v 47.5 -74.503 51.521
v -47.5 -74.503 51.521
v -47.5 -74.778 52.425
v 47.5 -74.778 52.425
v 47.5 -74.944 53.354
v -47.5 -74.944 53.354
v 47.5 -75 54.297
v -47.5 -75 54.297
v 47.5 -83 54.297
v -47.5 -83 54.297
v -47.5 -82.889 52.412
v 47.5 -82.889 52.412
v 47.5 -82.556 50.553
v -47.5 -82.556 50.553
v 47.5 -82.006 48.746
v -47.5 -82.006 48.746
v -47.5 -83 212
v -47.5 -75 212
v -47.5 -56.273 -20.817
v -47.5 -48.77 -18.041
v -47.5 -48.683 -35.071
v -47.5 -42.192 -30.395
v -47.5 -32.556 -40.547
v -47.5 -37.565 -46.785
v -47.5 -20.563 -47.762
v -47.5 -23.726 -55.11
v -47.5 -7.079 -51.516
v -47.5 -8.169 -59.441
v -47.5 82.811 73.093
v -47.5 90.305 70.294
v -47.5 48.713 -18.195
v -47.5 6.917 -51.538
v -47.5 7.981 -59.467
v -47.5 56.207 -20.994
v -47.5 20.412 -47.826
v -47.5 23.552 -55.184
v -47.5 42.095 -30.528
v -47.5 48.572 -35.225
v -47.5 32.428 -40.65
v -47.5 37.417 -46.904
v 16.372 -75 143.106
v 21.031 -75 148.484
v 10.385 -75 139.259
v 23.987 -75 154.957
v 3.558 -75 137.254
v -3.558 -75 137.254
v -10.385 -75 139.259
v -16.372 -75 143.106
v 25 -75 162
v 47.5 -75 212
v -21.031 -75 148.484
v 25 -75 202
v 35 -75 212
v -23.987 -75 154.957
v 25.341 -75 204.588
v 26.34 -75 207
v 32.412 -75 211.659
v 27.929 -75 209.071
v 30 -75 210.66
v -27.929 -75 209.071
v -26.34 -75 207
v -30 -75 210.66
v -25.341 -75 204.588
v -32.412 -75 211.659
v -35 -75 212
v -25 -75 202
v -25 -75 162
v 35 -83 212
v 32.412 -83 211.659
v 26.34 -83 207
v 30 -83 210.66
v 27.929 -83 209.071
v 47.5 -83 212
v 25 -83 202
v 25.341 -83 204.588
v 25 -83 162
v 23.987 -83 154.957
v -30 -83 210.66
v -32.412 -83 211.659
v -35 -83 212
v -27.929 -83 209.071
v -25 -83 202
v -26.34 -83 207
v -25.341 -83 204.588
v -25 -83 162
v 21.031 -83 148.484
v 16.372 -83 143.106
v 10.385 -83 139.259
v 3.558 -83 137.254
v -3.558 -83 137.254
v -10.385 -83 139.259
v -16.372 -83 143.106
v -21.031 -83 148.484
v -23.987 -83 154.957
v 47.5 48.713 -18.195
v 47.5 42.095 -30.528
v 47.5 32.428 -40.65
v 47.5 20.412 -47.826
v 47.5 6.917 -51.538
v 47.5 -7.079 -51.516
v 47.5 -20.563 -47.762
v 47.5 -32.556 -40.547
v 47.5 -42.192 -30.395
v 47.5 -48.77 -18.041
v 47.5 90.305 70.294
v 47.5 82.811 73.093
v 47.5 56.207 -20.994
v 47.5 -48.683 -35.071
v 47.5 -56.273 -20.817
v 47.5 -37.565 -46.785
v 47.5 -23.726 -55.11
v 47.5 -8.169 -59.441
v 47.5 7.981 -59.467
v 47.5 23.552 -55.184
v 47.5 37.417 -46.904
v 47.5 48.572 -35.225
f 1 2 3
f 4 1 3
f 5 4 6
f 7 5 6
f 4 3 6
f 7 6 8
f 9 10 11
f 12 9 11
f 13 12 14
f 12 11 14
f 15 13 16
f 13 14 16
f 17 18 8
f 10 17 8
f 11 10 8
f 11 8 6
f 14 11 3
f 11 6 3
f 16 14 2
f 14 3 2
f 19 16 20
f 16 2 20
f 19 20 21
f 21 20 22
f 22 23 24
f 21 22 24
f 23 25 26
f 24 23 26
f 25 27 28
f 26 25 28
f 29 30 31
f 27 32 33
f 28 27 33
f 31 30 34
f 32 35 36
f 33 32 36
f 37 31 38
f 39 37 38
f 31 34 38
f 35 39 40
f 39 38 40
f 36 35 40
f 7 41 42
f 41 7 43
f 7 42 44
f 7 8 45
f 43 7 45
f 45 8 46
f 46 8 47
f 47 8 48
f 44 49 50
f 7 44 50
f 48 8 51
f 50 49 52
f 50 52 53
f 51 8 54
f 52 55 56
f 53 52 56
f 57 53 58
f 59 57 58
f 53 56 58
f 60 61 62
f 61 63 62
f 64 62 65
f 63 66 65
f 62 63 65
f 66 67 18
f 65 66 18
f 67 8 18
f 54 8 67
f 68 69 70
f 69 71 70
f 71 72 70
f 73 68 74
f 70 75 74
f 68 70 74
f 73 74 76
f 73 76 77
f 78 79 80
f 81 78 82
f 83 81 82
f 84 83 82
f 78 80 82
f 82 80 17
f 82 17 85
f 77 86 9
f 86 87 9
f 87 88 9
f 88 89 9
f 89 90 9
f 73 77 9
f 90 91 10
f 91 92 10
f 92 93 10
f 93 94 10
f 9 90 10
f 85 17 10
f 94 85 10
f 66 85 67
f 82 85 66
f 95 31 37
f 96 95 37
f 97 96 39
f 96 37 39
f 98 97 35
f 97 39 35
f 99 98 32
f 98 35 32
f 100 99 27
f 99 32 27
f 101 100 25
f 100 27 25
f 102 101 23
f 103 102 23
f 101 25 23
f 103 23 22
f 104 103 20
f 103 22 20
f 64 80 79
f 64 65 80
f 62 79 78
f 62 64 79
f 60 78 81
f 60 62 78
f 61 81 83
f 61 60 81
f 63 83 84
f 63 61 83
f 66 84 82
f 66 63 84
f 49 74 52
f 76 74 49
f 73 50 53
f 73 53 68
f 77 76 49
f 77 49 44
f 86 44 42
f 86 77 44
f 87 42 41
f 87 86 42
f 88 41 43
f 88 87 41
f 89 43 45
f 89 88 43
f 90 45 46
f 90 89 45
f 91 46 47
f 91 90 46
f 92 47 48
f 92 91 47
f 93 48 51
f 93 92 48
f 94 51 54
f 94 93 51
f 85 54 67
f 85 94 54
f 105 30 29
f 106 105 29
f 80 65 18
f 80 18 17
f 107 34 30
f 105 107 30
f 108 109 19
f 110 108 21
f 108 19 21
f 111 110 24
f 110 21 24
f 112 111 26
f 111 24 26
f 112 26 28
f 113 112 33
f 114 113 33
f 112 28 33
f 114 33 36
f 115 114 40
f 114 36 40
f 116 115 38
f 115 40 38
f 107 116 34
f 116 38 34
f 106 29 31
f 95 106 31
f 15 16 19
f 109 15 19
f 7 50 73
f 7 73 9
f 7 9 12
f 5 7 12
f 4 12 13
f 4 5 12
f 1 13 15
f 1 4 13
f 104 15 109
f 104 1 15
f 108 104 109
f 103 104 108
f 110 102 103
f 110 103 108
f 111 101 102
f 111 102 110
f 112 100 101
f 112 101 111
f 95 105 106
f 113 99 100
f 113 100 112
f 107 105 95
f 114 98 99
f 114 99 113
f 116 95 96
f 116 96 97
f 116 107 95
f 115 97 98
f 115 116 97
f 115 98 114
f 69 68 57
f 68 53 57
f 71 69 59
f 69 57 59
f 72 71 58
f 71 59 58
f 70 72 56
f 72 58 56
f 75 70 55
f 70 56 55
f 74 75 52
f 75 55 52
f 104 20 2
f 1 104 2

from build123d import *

# Parameters (mm, degrees)
SM_START               = -47.5
SM_BASE_FLANGE_1_DEPTH = 95
CUT_EXTRUDE_1_DEPTH    = 278.911623222
FILLET_1_R             = 10


# Read off the part's stored shape, not the designer's step: 基体-法兰1
with BuildPart() as part:
    # 基体-法兰1 outline → 基体-法兰1 (new body)
    with BuildSketch(Plane(origin=(0, 0, 0), x_dir=(0, 0, -1), z_dir=(1, 0, 0)).offset(SM_START)):
        with BuildLine():
            Line((20.994484106, 56.207042593), (-70.293536893, 90.304992202))
            Line((-70.293536893, 90.304992202), (-73.092801441, 82.810719856))
            Line((-73.092801441, 82.810719856), (18.195219559, 48.712770248))
            ThreePointArc((18.195219559, 48.712770248), (51.999935218, -0.082081346), (18.041344088, -48.769969279))
            Line((18.041344088, -48.769969279), (-51.521246849, -74.503072197))
            ThreePointArc((-51.521246849, -74.503072197), (-52.886976122, -74.874788174), (-54.296838247, -75))
            Line((-54.296838247, -75), (-212, -75))
            Line((-212, -75), (-212, -83))
            Line((-212, -83), (-54.296838247, -83))
            ThreePointArc((-54.296838247, -83), (-51.477113996, -82.749576348), (-48.74565545, -82.006144394))
            Line((-48.74565545, -82.006144394), (20.816935486, -56.273041476))
            ThreePointArc((20.816935486, -56.273041476), (59.999925251, -0.094709246), (20.994484106, 56.207042593))
        make_face()
    extrude(amount=SM_BASE_FLANGE_1_DEPTH)

    # 草图6 → 切除-拉伸1 (cut, through all)
    with BuildSketch(Plane.XZ.offset(83)):
        with BuildLine():
            Line((-25, 162), (-25, 212))
            Line((-25, 212), (25, 212))
            Line((25, 212), (25, 162))
            ThreePointArc((25, 162), (0, 137), (-25, 162))
        make_face()
    extrude(amount=-CUT_EXTRUDE_1_DEPTH, mode=Mode.SUBTRACT)

    # 圆角1
    fillet_1_edges = [part.edges().sort_by_distance(p)[0] for p in [
        (-25, -79, 212),
        (25, -79, 212),
    ]]
    fillet(fillet_1_edges, radius=FILLET_1_R)


solid = part.part
